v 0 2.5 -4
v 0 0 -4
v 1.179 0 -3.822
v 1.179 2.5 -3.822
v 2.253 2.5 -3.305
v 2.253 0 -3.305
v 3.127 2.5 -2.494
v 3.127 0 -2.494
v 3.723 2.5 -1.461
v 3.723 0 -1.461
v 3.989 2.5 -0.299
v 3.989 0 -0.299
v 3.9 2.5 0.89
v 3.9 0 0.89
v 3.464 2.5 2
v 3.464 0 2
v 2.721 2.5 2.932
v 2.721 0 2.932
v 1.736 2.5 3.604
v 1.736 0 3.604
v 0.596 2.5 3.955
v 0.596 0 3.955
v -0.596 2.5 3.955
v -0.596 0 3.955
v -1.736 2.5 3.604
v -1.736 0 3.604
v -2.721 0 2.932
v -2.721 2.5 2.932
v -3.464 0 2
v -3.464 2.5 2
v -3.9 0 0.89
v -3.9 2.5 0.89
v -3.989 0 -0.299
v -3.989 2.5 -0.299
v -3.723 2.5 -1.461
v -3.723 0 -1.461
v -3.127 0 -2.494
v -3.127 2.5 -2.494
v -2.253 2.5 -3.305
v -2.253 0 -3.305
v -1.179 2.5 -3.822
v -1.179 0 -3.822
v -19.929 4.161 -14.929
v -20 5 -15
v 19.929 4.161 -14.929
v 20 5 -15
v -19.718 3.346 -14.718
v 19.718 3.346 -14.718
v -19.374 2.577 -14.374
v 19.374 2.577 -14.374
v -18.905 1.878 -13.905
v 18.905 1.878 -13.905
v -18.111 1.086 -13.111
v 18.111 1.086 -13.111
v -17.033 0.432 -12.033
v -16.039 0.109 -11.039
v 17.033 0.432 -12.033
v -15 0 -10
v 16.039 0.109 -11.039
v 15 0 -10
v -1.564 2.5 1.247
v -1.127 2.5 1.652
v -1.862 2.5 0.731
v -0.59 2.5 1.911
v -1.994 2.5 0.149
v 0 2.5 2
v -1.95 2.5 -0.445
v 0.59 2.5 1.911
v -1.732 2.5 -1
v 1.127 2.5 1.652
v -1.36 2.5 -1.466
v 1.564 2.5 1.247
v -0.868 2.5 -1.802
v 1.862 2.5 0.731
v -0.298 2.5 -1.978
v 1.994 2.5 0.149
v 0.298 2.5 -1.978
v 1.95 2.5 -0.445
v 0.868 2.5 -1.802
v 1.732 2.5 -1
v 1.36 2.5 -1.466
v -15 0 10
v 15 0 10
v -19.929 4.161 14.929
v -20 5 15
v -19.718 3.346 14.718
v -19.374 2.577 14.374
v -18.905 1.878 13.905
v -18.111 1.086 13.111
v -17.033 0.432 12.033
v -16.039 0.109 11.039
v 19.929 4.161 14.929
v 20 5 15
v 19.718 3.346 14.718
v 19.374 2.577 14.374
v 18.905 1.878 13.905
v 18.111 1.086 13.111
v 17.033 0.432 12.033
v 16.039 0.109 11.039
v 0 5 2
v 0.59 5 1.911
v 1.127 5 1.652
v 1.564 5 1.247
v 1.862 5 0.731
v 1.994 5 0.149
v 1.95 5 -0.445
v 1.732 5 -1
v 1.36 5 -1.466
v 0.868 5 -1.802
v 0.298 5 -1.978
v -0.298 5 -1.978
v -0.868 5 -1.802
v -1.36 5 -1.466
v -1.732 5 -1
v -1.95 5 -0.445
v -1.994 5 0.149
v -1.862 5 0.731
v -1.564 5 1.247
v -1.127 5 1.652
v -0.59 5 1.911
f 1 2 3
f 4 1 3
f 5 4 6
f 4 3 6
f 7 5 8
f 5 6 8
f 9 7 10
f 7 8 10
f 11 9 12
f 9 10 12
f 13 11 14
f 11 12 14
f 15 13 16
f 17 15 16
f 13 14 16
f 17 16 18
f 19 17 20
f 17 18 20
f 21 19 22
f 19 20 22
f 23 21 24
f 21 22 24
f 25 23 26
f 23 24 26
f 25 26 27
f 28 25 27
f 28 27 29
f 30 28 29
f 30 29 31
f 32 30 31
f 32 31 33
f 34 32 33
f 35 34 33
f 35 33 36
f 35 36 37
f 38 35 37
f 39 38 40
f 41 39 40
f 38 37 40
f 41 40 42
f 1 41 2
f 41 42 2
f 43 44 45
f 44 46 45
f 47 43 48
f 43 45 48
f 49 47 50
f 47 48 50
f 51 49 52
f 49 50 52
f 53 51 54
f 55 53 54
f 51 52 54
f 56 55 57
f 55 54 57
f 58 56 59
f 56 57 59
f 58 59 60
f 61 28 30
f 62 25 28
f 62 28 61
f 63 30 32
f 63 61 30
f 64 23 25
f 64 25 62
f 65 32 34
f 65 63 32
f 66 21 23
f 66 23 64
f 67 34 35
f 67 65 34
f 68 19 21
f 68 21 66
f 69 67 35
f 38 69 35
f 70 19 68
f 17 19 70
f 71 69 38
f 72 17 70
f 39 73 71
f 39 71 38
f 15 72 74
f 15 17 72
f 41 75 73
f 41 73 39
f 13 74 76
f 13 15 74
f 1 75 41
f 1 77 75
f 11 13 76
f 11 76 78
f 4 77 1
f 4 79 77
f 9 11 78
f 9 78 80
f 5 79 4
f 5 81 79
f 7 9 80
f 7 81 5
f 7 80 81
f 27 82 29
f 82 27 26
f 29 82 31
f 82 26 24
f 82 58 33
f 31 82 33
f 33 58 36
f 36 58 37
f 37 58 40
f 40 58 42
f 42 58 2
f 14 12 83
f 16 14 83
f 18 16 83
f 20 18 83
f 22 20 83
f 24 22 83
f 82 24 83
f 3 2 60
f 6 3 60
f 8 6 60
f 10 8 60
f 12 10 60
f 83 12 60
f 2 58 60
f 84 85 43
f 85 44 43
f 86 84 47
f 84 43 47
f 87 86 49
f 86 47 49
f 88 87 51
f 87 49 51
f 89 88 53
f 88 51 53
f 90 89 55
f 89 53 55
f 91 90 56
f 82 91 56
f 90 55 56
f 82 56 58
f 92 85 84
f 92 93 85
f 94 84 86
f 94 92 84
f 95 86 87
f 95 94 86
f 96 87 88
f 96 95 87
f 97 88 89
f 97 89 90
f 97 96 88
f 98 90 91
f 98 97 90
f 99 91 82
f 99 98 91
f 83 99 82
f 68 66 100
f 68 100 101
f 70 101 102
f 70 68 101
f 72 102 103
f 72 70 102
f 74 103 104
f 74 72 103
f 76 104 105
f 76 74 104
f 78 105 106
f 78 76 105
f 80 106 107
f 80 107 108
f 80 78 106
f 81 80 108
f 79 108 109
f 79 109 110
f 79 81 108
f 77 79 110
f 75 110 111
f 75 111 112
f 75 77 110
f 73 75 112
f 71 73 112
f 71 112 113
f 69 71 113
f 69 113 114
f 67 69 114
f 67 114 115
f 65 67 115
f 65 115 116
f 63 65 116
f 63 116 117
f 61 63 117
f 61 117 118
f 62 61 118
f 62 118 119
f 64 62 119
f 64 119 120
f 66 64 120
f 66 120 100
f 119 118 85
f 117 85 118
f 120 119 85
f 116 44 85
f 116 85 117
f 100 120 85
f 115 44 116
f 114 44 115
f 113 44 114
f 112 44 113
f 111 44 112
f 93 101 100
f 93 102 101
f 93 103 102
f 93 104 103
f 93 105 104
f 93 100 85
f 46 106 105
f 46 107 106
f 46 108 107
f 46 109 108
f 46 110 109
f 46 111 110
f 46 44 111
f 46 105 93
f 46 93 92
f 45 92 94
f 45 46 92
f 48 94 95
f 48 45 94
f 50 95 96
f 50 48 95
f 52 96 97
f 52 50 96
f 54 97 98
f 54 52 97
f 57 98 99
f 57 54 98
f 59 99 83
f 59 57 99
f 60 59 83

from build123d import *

# Parameters (mm, degrees)
ESQUISSE1_W     = 40
ESQUISSE1_H     = 30
ESQUISSE1_R     = 2
BASE_DEPTH      = 5
EXT_R           = 5
ESQUISSE2_R     = 4
ACCES_VIS_DEPTH = 2.5


with BuildPart() as part:
    # Esquisse1 → BASE (new body)
    with BuildSketch(Plane(origin=(0, 0, 0), x_dir=(1, 0, 0), z_dir=(0, 1, 0))):
        Rectangle(ESQUISSE1_W, ESQUISSE1_H)
        with Locations(Location((0, 0, 0), (0, 0, 270))):
            Circle(ESQUISSE1_R, mode=Mode.SUBTRACT)
    extrude(amount=BASE_DEPTH)

    # EXT
    ext_edges = [part.edges().sort_by_distance(p)[0] for p in [
        (-20, 0, 0),
        (0, 0, -15),
        (20, 0, 0),
        (0, 0, 15),
    ]]
    fillet(ext_edges, radius=EXT_R - 0.0001)  # a hair under: the kernel refuses the full size

    # Esquisse2 → ACCES VIS (cut)
    with BuildSketch(Plane(origin=(0, 0, 0), x_dir=(-1, 0, 0), z_dir=(0, -1, 0))):
        with Locations(Location((0, 0, 0), (0, 0, 90))):
            Circle(ESQUISSE2_R)
    extrude(amount=-ACCES_VIS_DEPTH, mode=Mode.SUBTRACT)


solid = part.part
